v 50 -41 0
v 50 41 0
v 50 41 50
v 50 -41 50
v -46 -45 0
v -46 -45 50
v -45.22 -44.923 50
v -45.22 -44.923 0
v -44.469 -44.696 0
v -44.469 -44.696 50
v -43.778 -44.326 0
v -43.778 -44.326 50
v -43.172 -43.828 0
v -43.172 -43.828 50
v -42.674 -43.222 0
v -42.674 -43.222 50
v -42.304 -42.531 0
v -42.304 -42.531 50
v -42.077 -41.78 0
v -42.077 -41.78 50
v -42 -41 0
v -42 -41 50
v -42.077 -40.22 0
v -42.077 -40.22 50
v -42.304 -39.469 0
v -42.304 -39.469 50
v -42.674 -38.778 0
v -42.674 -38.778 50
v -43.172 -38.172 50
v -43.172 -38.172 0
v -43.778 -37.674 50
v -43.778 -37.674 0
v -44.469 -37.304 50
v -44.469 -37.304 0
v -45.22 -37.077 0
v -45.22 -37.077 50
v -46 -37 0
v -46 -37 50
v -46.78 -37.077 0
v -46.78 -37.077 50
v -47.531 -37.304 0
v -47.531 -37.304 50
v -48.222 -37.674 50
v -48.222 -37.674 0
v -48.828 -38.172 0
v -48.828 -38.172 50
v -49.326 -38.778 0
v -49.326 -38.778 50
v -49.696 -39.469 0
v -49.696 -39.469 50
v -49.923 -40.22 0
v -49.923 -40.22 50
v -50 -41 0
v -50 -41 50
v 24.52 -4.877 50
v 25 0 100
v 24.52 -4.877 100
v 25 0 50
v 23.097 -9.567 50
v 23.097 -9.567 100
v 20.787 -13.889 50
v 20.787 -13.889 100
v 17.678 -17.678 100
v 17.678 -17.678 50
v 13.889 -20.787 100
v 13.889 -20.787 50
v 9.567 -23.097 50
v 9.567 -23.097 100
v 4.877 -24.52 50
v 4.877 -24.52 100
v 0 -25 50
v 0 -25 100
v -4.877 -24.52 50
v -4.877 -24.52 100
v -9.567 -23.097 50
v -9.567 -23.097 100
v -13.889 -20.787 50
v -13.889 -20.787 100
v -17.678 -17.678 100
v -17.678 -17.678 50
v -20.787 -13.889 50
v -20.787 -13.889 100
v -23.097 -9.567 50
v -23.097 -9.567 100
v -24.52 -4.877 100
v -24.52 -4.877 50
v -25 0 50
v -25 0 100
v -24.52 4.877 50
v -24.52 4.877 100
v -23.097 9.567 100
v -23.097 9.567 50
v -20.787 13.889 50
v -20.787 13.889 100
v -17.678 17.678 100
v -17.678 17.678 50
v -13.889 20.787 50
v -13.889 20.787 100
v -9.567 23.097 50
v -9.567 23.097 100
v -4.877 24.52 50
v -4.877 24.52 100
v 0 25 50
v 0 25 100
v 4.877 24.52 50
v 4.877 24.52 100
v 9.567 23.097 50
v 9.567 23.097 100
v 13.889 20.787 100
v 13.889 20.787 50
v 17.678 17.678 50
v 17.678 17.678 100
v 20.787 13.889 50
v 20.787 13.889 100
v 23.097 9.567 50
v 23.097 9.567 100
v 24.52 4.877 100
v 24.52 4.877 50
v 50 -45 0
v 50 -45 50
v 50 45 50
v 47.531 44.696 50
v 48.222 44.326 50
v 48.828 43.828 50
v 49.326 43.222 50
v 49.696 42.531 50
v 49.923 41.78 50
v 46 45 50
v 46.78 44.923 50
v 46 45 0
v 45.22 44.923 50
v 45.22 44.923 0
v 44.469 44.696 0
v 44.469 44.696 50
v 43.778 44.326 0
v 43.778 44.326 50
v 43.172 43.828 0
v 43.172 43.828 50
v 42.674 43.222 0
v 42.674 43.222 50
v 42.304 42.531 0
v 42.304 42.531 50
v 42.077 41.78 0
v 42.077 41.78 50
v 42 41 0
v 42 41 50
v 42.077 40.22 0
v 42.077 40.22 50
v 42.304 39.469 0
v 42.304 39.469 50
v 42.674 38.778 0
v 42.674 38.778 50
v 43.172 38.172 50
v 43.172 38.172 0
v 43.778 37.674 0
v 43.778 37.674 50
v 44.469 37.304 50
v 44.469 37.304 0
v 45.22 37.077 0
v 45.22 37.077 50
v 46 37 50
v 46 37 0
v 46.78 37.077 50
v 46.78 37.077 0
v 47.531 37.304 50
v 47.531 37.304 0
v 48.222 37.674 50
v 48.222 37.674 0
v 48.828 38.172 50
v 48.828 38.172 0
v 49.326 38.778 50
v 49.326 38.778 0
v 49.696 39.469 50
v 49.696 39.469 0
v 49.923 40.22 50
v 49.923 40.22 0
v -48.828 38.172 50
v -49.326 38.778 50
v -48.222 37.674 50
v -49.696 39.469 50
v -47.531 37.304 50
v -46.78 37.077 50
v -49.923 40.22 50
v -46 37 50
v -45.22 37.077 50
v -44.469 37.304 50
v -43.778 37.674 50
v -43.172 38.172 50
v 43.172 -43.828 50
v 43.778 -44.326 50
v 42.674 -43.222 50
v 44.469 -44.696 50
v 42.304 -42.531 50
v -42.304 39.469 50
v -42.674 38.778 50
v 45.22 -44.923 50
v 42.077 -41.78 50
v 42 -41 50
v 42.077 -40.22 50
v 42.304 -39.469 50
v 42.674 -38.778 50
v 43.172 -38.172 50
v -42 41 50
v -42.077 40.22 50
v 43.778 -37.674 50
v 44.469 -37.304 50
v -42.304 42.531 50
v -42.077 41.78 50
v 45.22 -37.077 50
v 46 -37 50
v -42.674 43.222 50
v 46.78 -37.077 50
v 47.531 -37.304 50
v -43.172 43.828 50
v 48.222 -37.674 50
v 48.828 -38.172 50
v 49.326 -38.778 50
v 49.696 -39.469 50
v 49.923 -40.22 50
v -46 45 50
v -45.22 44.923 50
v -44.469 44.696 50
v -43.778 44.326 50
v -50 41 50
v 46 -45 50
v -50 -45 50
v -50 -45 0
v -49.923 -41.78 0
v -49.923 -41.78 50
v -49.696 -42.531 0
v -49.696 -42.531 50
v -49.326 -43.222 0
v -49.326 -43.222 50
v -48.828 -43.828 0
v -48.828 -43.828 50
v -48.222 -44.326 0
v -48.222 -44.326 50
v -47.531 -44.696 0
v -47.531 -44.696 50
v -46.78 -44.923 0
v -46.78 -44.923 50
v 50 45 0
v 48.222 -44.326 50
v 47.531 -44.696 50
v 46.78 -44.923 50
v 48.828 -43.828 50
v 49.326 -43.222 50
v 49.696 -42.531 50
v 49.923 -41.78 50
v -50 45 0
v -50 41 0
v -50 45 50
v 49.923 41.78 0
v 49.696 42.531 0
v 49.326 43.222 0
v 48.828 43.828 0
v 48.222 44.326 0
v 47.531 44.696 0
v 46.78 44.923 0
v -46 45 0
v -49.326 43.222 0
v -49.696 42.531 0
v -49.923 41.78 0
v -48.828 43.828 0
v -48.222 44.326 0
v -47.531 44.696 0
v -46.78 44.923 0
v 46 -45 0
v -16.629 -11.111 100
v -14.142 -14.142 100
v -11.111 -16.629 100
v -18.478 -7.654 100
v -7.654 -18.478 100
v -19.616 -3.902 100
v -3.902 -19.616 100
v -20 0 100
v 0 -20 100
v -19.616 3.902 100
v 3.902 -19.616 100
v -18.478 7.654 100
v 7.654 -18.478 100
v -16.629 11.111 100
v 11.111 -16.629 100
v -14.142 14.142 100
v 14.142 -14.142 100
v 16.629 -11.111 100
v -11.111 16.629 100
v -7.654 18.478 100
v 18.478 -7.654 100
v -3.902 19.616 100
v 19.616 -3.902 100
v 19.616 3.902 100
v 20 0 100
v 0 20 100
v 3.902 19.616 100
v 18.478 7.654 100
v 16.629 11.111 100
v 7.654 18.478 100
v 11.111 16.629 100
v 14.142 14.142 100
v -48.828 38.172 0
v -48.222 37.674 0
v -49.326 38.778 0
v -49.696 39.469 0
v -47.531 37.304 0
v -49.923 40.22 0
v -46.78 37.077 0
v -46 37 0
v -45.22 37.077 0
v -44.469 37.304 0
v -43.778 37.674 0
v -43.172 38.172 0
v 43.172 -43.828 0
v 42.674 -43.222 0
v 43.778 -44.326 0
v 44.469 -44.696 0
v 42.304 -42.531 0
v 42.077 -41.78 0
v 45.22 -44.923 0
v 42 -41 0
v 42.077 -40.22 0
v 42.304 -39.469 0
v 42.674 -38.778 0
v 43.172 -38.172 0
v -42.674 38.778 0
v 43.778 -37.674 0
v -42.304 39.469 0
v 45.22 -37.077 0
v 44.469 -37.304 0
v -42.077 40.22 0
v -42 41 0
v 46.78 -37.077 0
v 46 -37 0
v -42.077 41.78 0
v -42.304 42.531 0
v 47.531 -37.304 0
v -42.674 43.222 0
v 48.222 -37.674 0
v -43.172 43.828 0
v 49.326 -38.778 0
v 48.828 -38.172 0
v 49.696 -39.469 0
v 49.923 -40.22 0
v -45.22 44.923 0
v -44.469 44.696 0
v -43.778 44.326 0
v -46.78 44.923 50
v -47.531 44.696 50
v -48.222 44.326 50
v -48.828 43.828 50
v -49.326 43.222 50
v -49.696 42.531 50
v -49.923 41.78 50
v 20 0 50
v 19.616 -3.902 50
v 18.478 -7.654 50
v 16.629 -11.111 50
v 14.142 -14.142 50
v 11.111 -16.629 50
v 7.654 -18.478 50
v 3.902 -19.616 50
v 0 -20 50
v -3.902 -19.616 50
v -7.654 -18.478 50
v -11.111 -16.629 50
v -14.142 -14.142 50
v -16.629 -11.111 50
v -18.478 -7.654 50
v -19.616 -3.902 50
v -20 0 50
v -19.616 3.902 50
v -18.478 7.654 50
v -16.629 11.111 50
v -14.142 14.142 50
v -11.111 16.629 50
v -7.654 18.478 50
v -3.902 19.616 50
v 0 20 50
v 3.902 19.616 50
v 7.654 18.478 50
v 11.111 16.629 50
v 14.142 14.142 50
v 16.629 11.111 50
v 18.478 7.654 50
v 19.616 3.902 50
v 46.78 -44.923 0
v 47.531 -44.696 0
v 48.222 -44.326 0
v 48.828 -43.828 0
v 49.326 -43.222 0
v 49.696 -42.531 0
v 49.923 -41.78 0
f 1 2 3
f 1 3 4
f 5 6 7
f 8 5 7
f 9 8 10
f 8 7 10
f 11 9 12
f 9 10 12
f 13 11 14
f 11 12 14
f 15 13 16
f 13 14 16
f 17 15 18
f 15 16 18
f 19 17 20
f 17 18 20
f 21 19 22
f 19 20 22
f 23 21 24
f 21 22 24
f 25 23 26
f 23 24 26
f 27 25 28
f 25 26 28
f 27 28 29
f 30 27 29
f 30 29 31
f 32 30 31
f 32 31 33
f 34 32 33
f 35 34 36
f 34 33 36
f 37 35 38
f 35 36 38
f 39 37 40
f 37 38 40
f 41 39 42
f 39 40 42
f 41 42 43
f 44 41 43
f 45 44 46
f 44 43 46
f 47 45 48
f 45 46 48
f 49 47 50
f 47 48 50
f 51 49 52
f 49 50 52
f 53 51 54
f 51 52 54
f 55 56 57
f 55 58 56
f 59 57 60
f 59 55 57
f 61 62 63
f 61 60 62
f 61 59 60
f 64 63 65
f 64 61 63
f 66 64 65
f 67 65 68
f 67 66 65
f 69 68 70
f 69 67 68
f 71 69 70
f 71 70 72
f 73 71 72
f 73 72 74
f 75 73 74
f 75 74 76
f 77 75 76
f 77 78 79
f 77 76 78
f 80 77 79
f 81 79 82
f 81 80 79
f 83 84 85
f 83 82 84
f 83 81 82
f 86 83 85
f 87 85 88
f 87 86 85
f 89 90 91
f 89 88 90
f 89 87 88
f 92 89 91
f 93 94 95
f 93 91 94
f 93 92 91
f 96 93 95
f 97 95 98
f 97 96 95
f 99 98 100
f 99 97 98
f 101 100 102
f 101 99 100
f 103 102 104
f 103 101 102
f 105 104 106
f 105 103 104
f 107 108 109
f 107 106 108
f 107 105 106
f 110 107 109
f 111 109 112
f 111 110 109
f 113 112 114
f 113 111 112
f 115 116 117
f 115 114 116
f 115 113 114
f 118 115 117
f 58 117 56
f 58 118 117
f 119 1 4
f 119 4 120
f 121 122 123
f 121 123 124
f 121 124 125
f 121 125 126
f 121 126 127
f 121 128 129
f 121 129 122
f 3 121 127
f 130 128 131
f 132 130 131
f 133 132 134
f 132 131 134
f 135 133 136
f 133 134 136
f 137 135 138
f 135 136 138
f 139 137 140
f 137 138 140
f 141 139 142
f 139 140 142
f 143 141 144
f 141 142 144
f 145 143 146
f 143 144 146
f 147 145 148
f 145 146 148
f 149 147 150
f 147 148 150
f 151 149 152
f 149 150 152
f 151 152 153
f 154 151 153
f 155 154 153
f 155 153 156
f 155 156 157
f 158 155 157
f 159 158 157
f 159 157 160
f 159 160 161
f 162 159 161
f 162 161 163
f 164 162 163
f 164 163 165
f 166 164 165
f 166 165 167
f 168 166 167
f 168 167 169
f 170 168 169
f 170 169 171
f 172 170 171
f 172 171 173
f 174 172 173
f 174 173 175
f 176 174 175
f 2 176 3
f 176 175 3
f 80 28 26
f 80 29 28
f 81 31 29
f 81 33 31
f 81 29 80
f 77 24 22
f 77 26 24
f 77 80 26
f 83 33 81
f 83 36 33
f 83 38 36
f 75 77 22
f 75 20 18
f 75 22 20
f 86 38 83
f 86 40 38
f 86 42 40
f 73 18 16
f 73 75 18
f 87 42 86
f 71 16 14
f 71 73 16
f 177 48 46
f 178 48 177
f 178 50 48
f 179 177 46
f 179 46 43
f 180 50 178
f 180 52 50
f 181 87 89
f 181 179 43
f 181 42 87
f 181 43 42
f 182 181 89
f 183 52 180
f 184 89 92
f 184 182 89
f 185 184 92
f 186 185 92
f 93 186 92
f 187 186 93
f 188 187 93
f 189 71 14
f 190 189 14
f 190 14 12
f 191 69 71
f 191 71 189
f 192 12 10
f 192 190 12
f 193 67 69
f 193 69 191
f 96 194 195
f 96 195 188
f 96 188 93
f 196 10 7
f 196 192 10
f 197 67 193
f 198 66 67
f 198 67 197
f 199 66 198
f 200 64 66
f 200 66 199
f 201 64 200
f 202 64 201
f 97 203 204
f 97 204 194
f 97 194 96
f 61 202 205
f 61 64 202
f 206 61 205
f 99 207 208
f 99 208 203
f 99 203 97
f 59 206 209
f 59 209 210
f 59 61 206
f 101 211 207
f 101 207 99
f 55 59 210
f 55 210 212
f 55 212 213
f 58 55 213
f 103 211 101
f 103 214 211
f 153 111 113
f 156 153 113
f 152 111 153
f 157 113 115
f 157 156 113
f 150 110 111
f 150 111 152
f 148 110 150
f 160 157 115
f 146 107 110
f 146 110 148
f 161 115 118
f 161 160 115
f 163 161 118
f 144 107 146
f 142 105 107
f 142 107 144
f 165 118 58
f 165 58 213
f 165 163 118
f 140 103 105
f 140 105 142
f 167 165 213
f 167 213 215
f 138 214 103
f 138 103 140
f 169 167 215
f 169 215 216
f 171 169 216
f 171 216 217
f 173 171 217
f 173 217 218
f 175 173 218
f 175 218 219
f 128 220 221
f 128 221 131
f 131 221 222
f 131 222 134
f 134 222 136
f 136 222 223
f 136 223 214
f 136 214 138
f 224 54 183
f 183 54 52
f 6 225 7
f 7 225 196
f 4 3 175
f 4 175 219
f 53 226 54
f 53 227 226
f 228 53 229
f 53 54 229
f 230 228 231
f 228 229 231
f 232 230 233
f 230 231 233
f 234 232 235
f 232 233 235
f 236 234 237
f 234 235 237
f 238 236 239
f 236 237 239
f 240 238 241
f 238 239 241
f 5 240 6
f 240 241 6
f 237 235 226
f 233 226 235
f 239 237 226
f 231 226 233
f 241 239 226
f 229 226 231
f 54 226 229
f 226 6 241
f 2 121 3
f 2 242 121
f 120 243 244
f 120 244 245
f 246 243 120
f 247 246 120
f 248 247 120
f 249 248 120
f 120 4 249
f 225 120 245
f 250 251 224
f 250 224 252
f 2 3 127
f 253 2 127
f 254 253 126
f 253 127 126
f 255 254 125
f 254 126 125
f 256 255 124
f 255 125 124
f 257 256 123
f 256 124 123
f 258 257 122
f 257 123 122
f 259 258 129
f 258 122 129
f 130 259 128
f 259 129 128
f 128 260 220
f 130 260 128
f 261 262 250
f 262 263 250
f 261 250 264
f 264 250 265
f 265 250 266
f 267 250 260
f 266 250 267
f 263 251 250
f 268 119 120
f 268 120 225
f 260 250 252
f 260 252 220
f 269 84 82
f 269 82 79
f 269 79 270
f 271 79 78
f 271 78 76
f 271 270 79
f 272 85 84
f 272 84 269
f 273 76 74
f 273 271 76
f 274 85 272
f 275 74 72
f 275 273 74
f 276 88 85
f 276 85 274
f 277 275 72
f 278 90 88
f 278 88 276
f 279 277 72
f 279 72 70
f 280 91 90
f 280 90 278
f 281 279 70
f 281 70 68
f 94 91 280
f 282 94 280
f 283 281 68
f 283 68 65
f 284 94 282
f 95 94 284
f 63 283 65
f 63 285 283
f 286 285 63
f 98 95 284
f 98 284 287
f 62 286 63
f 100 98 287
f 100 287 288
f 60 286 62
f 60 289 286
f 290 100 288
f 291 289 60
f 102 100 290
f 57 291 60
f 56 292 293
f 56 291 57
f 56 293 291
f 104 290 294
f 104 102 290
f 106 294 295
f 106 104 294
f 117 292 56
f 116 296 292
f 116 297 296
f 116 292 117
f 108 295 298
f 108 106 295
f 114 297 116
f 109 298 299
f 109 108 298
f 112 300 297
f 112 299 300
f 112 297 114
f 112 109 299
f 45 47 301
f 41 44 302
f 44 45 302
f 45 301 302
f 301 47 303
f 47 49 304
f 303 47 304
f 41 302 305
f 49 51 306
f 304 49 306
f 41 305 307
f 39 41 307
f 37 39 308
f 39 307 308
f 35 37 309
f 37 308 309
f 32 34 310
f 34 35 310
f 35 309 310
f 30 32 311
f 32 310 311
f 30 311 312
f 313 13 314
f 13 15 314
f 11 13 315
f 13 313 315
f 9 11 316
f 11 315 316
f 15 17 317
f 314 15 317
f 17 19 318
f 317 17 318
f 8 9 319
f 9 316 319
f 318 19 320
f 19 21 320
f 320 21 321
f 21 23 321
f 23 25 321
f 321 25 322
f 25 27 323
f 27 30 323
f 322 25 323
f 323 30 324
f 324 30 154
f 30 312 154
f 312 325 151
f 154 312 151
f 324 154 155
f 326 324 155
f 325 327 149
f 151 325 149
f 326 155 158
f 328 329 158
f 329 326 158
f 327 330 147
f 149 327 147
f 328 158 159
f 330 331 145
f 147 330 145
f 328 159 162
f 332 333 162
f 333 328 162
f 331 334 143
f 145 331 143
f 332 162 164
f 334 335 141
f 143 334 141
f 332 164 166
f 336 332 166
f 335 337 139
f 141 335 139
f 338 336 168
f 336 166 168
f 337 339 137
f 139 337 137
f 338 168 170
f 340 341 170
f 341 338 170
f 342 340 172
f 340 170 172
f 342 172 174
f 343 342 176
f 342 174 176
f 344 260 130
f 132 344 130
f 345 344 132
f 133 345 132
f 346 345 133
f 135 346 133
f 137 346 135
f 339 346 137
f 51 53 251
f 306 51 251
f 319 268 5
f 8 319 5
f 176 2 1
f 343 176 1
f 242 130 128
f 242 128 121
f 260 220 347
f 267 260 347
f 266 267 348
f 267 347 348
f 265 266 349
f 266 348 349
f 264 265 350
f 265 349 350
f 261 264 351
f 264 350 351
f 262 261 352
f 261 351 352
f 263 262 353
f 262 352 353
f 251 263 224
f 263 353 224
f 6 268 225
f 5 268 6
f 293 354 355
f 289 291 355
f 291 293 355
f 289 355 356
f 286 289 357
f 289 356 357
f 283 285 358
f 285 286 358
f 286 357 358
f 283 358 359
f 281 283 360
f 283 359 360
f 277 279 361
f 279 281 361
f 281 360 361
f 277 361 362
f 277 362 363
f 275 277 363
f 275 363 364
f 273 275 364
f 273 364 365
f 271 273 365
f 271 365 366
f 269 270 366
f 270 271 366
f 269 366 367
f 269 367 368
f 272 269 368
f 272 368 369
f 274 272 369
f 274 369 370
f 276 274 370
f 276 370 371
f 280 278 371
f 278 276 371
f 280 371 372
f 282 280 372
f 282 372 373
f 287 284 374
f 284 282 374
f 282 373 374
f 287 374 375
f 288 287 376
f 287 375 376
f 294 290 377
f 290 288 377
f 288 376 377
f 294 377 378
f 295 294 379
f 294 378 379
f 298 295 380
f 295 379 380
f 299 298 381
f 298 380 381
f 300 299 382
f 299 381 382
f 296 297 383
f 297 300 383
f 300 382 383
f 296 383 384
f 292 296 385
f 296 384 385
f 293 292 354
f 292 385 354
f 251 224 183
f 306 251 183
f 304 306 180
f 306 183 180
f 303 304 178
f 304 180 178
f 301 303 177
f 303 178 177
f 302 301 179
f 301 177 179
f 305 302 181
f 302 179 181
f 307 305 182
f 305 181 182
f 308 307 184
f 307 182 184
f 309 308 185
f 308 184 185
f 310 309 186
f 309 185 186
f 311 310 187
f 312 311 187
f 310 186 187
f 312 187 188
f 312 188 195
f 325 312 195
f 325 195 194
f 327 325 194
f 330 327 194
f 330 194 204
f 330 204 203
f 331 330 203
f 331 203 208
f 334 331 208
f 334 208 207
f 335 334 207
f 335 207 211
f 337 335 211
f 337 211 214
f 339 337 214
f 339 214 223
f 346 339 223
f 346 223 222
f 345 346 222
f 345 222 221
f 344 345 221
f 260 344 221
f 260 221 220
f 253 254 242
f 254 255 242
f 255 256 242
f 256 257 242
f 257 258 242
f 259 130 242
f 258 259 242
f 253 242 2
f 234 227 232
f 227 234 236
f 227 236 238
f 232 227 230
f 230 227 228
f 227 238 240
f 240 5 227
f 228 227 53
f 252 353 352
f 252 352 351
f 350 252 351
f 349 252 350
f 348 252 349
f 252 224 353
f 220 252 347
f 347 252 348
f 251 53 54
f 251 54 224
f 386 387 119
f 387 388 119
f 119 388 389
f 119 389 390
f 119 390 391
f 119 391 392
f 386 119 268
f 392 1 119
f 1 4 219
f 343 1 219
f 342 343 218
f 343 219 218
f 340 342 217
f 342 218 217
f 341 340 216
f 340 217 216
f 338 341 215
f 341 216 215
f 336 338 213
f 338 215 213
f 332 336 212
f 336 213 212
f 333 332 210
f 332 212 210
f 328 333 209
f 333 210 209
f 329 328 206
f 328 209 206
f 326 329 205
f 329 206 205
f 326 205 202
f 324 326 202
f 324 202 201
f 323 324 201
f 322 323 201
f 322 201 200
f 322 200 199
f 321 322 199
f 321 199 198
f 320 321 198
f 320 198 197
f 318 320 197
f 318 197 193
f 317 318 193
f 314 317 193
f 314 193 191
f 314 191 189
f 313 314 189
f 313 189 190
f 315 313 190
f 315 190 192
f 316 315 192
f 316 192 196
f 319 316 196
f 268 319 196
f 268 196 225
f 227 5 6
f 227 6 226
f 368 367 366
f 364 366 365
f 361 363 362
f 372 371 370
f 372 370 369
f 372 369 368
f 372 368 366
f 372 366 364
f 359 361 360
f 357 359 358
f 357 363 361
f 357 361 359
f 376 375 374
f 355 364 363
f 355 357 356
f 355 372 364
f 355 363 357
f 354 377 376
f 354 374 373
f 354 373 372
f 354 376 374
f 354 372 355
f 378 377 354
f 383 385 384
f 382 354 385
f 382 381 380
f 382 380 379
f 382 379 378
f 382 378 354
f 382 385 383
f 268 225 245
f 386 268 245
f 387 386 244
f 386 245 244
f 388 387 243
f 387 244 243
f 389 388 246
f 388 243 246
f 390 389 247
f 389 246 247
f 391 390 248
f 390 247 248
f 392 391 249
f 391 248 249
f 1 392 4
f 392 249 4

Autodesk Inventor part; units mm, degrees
ref_plane "YZ Plane" through (0, 0, 0) normal (1, 0, 0) x (0, 1, 0)
ref_plane "XZ Plane" through (0, 0, 0) normal (0, 1, 0) x (-1, 0, 0)
ref_plane "XY Plane" through (0, 0, 0) normal (0, 0, 1) x (1, 0, 0)
sketch "Sketch1" plane through (0, 0, 0) normal (0, 0, 1) x (1, 0, 0)
  line L0 (50, -45) -> (-50, -45)
  line L1 (-50, -45) -> (-50, 45)
  line L2 (-50, 45) -> (50, 45)
  line L3 (50, 45) -> (50, -45)
  line L4 (50, -45) -> (-50, 45) construction
  line L5 (-50, -45) -> (50, 45) construction
  point P0 (0, 0)
  dimension "d0" = 100
  dimension "d1" = 90
extrude "Extrusion1" add sketch "Sketch1" along normal blind 50
sketch "Sketch2" plane through (0, 0, 50) normal (0, 0, 1) x (1, 0, 0)
  line L0 (50, -45) -> (50, 45) projected
  line L1 (50, 45) -> (-50, 45) projected
  circle A0 centre (46, 41) radius 4
  circle A1 centre (-46, 41) radius 4
  line L2 (-50, 45) -> (-50, -45) projected
  circle A2 centre (-46, -41) radius 4
  line L3 (-50, -45) -> (50, -45) projected
  circle A3 centre (46, -41) radius 4
  point P0 (0, 0)
extrude "Extrusion2" cut sketch "Sketch2" against normal through all contours A3 | A0 | A2 | A1
sketch "Sketch3" plane through (0, 0, 50) normal (0, 0, 1) x (1, 0, 0)
  circle A0 centre (0, 0) radius 25
  circle A1 centre (0, 0) radius 20
extrude "Extrusion3" add sketch "Sketch3" along normal blind 50
thread "Thread1" size "M50x4" class "6H" standard "ANSI Metric M Profile" length 30
properties part number "Práctica1"
